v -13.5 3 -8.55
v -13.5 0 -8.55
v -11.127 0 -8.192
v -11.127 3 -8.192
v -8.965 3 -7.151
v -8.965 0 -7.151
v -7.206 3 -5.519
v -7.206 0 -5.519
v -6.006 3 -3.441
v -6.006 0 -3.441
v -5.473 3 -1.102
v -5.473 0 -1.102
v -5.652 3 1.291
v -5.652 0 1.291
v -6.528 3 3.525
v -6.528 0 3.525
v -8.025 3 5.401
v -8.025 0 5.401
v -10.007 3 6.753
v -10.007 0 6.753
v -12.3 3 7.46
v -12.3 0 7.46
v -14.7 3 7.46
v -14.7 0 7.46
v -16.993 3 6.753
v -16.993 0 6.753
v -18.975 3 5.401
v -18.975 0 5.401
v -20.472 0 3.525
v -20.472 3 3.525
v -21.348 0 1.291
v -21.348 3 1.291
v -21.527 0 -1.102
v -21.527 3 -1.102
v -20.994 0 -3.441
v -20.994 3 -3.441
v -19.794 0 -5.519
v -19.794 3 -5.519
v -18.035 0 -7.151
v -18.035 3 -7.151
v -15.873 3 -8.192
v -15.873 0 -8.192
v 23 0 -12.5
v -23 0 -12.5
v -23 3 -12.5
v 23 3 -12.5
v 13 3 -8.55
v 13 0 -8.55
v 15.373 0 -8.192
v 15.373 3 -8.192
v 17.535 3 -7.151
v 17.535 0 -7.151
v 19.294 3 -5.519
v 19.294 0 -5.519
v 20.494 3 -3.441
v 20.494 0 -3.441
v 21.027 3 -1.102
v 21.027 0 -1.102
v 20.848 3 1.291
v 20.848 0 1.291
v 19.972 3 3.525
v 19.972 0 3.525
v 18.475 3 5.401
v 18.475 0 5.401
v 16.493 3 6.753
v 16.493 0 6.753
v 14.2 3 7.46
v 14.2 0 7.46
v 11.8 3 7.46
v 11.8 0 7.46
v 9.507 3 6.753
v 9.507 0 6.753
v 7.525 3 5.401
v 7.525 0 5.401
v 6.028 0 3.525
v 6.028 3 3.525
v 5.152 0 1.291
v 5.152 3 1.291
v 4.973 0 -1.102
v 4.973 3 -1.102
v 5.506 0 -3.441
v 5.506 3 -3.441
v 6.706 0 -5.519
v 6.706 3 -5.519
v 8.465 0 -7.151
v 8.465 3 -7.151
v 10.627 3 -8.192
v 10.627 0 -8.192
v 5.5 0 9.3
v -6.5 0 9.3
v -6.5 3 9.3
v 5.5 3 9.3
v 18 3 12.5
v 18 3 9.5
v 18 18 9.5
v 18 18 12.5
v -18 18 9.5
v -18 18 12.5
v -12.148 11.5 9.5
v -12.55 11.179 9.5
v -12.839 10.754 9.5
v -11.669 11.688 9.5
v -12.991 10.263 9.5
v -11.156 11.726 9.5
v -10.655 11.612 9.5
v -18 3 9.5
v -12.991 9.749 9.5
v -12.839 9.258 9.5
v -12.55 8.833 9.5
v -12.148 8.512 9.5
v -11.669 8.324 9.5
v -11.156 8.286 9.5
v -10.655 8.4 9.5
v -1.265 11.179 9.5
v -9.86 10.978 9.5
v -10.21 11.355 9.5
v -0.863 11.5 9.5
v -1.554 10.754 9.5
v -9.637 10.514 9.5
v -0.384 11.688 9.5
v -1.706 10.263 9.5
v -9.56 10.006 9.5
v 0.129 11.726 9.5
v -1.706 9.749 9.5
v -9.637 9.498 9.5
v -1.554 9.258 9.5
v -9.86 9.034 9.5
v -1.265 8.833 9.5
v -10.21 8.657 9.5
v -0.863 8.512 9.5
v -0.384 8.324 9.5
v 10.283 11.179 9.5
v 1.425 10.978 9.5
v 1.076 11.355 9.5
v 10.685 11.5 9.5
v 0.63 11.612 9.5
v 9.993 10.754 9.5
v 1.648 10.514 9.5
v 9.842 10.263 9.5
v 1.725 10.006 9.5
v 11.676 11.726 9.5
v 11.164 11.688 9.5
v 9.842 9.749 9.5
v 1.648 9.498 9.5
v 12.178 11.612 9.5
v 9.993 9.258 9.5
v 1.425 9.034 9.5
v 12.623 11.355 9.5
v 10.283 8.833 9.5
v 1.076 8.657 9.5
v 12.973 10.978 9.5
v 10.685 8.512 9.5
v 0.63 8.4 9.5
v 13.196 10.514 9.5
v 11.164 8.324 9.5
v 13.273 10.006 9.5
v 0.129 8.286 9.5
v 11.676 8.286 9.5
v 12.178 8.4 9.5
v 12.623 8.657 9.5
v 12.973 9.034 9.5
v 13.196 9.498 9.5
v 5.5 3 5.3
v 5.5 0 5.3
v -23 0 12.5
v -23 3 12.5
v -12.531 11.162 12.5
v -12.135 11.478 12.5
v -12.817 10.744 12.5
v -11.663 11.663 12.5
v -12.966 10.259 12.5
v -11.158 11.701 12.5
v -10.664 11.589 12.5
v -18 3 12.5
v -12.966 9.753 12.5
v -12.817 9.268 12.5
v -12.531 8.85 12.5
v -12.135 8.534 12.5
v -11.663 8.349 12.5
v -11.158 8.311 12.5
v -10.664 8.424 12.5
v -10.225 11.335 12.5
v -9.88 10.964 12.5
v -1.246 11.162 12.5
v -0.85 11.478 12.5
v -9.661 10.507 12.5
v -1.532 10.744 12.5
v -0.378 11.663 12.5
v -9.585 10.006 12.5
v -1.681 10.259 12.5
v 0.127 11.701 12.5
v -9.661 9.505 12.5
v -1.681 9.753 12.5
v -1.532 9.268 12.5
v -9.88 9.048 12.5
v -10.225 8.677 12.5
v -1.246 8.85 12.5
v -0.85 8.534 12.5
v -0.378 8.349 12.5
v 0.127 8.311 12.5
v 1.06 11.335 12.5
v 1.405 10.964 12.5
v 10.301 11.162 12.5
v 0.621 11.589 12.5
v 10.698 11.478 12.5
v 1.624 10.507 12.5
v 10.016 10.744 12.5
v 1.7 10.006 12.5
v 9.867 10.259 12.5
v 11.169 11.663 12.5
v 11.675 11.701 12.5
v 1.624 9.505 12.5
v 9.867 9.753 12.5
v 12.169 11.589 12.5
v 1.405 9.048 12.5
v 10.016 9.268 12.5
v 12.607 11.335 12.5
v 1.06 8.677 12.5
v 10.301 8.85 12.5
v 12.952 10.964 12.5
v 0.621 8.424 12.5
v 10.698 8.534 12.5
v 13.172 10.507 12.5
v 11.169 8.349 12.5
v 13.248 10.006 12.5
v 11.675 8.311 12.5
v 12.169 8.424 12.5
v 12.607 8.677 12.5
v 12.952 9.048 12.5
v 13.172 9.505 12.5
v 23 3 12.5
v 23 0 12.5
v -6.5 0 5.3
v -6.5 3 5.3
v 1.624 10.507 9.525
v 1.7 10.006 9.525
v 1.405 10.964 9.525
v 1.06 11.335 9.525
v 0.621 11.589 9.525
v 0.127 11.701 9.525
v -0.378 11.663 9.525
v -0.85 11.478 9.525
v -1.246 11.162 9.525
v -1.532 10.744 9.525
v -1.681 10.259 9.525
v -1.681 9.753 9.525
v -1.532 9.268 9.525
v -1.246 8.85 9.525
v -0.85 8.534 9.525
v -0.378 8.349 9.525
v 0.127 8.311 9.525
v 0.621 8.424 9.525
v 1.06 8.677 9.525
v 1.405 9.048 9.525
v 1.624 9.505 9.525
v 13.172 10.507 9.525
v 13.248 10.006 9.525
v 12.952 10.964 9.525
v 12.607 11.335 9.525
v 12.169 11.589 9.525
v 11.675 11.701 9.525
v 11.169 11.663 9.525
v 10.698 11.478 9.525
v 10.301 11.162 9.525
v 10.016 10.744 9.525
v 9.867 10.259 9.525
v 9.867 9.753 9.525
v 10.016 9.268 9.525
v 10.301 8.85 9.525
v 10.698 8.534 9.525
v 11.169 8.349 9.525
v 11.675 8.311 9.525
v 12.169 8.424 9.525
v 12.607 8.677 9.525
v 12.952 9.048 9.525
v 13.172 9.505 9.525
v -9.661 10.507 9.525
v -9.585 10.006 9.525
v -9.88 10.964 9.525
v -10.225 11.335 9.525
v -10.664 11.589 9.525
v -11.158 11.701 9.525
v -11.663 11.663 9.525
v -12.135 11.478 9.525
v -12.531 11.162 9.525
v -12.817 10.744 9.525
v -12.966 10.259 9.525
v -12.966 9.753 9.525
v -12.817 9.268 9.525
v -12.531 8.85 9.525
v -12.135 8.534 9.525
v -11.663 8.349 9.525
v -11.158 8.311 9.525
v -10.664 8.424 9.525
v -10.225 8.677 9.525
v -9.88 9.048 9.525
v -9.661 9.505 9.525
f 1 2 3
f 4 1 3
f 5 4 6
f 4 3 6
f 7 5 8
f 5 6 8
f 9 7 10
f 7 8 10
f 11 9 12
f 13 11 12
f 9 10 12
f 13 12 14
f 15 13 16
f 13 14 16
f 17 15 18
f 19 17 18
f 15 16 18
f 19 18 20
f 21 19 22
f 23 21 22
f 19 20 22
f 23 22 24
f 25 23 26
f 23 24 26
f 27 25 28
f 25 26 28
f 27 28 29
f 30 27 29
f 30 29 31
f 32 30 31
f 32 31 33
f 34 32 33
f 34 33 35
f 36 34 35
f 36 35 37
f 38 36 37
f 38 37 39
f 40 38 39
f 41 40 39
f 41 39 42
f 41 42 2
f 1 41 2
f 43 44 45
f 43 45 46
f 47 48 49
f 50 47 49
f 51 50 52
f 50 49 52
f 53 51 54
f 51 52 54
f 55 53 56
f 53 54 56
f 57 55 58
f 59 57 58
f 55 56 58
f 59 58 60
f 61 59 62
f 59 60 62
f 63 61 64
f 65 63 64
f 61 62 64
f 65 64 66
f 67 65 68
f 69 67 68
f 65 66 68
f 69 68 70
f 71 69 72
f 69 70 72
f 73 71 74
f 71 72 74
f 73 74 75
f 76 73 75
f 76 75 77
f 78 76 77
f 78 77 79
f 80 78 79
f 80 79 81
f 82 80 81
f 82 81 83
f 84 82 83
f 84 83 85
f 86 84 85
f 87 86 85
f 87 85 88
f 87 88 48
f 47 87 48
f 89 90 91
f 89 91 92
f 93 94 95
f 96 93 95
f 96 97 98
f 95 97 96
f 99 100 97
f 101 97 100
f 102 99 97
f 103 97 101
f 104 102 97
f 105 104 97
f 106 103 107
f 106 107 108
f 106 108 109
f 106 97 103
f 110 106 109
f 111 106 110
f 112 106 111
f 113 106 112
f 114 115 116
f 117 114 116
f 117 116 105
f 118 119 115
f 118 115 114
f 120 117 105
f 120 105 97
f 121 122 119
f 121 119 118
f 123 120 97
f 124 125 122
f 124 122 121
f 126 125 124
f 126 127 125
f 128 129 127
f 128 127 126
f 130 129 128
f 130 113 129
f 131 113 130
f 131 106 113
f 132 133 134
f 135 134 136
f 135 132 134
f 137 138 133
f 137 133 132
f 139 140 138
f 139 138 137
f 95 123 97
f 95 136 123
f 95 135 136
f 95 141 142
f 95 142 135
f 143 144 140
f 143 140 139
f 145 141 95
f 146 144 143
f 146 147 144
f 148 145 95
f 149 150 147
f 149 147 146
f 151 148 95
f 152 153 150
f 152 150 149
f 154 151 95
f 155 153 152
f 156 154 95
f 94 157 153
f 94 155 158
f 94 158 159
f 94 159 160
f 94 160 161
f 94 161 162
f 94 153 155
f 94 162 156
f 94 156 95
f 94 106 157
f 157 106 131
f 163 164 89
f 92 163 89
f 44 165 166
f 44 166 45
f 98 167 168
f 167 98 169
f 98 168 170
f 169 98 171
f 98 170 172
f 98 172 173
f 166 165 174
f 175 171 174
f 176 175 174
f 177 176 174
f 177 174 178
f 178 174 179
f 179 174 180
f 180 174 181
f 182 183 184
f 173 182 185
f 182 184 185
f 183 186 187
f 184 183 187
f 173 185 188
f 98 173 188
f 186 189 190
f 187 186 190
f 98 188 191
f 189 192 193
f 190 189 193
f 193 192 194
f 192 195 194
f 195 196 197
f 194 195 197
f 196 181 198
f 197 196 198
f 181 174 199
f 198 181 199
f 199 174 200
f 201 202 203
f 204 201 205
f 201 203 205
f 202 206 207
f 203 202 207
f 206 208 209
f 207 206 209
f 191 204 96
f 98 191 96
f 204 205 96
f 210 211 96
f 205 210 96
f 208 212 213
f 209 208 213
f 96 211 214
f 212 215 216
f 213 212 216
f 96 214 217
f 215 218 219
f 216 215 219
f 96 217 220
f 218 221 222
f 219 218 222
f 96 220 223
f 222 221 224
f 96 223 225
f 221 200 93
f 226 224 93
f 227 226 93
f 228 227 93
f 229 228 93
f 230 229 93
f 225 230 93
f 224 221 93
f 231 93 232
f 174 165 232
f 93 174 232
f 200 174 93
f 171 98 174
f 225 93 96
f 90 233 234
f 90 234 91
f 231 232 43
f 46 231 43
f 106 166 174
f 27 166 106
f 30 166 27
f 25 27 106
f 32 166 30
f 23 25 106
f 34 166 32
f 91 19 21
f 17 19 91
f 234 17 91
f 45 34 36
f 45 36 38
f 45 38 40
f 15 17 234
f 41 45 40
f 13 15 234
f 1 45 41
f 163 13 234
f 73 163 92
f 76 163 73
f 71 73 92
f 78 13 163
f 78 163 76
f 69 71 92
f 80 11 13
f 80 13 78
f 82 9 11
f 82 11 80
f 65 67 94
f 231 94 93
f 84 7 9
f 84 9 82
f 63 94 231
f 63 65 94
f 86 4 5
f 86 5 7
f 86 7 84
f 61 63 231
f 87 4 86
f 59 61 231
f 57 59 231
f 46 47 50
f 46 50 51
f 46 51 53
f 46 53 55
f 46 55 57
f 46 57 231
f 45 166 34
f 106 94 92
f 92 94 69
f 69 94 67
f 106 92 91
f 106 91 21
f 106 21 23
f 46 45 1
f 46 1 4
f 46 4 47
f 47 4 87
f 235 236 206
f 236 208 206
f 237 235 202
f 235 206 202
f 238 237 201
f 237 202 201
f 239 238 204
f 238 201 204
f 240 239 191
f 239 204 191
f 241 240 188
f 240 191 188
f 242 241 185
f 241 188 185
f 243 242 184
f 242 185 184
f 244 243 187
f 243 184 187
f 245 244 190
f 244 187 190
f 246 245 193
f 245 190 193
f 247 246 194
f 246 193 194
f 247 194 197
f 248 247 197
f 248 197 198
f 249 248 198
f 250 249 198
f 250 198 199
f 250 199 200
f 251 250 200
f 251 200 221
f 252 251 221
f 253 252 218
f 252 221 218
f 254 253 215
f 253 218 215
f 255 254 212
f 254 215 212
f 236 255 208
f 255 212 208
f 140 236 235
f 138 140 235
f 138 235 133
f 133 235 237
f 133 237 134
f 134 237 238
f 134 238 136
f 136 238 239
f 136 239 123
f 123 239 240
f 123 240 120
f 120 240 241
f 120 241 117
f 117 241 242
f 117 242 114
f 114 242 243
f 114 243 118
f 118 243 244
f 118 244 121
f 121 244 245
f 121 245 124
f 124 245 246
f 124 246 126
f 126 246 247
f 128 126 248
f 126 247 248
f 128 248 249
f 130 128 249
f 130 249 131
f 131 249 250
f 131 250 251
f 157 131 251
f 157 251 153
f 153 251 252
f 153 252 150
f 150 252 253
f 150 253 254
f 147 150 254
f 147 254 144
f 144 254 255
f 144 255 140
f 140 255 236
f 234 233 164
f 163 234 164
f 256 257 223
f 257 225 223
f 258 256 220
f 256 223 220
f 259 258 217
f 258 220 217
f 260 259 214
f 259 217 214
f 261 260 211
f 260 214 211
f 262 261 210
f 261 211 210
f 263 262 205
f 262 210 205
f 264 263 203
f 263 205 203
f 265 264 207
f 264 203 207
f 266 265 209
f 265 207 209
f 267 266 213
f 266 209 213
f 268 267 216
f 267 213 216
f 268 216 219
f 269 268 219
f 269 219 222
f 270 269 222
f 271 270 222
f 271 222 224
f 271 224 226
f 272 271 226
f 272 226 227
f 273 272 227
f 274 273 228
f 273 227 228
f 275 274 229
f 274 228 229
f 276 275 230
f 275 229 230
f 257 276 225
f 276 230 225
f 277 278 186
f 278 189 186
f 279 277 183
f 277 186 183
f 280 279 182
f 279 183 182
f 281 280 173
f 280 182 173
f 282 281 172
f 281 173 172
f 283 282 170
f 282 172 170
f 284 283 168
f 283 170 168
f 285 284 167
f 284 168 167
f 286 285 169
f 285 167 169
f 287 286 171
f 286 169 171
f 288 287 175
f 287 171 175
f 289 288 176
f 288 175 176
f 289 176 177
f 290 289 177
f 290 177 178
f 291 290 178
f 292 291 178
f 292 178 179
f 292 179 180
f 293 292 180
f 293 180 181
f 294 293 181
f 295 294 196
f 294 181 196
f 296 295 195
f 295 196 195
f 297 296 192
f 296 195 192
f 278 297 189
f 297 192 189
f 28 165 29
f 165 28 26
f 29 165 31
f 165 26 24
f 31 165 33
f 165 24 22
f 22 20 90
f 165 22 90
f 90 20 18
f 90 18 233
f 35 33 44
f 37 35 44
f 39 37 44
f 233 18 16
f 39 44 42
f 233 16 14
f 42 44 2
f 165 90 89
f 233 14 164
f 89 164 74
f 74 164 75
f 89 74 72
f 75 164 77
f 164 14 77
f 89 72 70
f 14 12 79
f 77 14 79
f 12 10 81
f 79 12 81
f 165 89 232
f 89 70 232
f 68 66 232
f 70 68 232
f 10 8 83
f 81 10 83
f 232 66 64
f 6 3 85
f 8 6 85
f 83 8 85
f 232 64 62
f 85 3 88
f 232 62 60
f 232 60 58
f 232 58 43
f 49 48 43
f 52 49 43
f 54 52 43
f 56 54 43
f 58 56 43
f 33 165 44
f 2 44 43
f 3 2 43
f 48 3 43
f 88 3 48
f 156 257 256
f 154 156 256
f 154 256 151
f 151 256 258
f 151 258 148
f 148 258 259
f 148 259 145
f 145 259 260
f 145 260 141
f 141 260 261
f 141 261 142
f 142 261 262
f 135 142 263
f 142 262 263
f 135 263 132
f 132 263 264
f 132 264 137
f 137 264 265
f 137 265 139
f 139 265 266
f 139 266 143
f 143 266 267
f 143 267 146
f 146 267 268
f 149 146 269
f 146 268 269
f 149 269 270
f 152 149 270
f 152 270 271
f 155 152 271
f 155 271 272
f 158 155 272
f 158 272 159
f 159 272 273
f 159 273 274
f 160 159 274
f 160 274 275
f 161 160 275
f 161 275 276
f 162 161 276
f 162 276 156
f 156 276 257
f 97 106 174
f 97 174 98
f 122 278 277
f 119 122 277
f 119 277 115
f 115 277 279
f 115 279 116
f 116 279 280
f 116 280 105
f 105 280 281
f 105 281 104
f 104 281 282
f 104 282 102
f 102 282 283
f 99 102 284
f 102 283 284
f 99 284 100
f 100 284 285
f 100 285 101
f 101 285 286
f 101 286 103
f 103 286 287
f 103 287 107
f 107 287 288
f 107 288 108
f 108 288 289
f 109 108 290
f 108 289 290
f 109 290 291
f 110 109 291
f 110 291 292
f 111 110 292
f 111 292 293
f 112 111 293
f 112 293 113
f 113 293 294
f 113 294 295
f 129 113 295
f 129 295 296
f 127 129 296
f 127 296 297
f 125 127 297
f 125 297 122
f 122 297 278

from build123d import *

# Parameters (mm, degrees)
SKIZZE1_W                            = 46
SKIZZE1_H                            = 25
AUFSATZ_LINEAR_AUSTRAGEN1_DEPTH      = 3
SKIZZE3_W                            = 46
SKIZZE3_H                            = 3
AUFSATZ_LINEAR_AUSTRAGEN2_DEPTH      = 15
SCHNITT_LINEAR_AUSTRAGEN1_REACH      = 38.565
SKIZZE7_W                            = 5
SKIZZE7_H                            = 15
F_3_4_3_4_DIAMETER_HOLE2_D           = 3.4
F_3_4_3_4_DIAMETER_HOLE2_CSINK_D     = 3.45
F_3_4_3_4_DIAMETER_HOLE2_CSINK_ANGLE = 90
SCHNITT_LINEAR_AUSTRAGEN2_REACH      = 33.769
SKIZZE12_R                           = 8.05
SKIZZE12_W                           = 12
SKIZZE12_H                           = 4


with BuildPart() as part:
    # Skizze1 → Aufsatz-Linear austragen1 (new body)
    with BuildSketch(Plane(origin=(0, 0, 0), x_dir=(1, 0, 0), z_dir=(0, 1, 0))):
        Rectangle(SKIZZE1_W, SKIZZE1_H)
    extrude(amount=AUFSATZ_LINEAR_AUSTRAGEN1_DEPTH)

    # Skizze3 → Aufsatz-Linear austragen2 (add)
    with BuildSketch(Plane(origin=(0, 3, 0), x_dir=(1, 0, 0), z_dir=(0, 1, 0))):
        with Locations((0, -11)):
            Rectangle(SKIZZE3_W, SKIZZE3_H)
    extrude(amount=AUFSATZ_LINEAR_AUSTRAGEN2_DEPTH)

    # Skizze7 → Schnitt-Linear austragen1 (cut, up to next)
    with BuildSketch(Plane(origin=(0, 0, 9.5), x_dir=(-1, 0, 0), z_dir=(0, 0, -1)), mode=Mode.PRIVATE) as schnitt_linear_austragen1_sk1:
        with Locations((-20.5, 10.5)):
            Rectangle(SKIZZE7_W, SKIZZE7_H)
    schnitt_linear_austragen1_tool1 = extrude(schnitt_linear_austragen1_sk1.sketch, amount=-SCHNITT_LINEAR_AUSTRAGEN1_REACH, mode=Mode.PRIVATE) & part.part
    # Skizze7 → Schnitt-Linear austragen1 (cut, up to next)
    with BuildSketch(Plane(origin=(0, 0, 9.5), x_dir=(-1, 0, 0), z_dir=(0, 0, -1)), mode=Mode.PRIVATE) as schnitt_linear_austragen1_sk2:
        with Locations((20.5, 10.5)):
            Rectangle(SKIZZE7_W, SKIZZE7_H)
    schnitt_linear_austragen1_tool2 = extrude(schnitt_linear_austragen1_sk2.sketch, amount=-SCHNITT_LINEAR_AUSTRAGEN1_REACH, mode=Mode.PRIVATE) & part.part
    add(schnitt_linear_austragen1_tool1.solids().sort_by_distance((20.5, 10.5, 9.5))[0], mode=Mode.SUBTRACT)
    add(schnitt_linear_austragen1_tool2.solids().sort_by_distance((-20.5, 10.5, 9.5))[0], mode=Mode.SUBTRACT)

    # Ø3.4 (3.4) Diameter Hole2 (through all)
    with Locations(Plane(origin=(0, 0, 9.5), x_dir=(-1, 0, 0), z_dir=(0, 0, -1))):
        with Locations((-11.547540619, 10.006035736), (0, 10.006035736), (11.285096514, 10.006035736)):
            CounterSinkHole(F_3_4_3_4_DIAMETER_HOLE2_D / 2, F_3_4_3_4_DIAMETER_HOLE2_CSINK_D / 2, counter_sink_angle=F_3_4_3_4_DIAMETER_HOLE2_CSINK_ANGLE)

    # Skizze12 → Schnitt-Linear austragen2 (cut, up to next)
    with BuildSketch(Plane.XZ, mode=Mode.PRIVATE) as schnitt_linear_austragen2_sk1:
        with Locations(Location((-13.5, -0.5, 0), (0, 0, 270))):
            Circle(SKIZZE12_R)
    schnitt_linear_austragen2_tool1 = extrude(schnitt_linear_austragen2_sk1.sketch, amount=-SCHNITT_LINEAR_AUSTRAGEN2_REACH, mode=Mode.PRIVATE) & part.part
    # Skizze12 → Schnitt-Linear austragen2 (cut, up to next)
    with BuildSketch(Plane.XZ, mode=Mode.PRIVATE) as schnitt_linear_austragen2_sk2:
        with Locations(Location((13, -0.5, 0), (0, 0, 270))):
            Circle(SKIZZE12_R)
    schnitt_linear_austragen2_tool2 = extrude(schnitt_linear_austragen2_sk2.sketch, amount=-SCHNITT_LINEAR_AUSTRAGEN2_REACH, mode=Mode.PRIVATE) & part.part
    # Skizze12 → Schnitt-Linear austragen2 (cut, up to next)
    with BuildSketch(Plane.XZ, mode=Mode.PRIVATE) as schnitt_linear_austragen2_sk3:
        with Locations((-0.5, 7.3)):
            Rectangle(SKIZZE12_W, SKIZZE12_H)
    schnitt_linear_austragen2_tool3 = extrude(schnitt_linear_austragen2_sk3.sketch, amount=-SCHNITT_LINEAR_AUSTRAGEN2_REACH, mode=Mode.PRIVATE) & part.part
    add(schnitt_linear_austragen2_tool1.solids().sort_by_distance((-13.5, 0, -0.5))[0], mode=Mode.SUBTRACT)
    add(schnitt_linear_austragen2_tool2.solids().sort_by_distance((13, 0, -0.5))[0], mode=Mode.SUBTRACT)
    add(schnitt_linear_austragen2_tool3.solids().sort_by_distance((-0.5, 0, 7.3))[0], mode=Mode.SUBTRACT)


solid = part.part
